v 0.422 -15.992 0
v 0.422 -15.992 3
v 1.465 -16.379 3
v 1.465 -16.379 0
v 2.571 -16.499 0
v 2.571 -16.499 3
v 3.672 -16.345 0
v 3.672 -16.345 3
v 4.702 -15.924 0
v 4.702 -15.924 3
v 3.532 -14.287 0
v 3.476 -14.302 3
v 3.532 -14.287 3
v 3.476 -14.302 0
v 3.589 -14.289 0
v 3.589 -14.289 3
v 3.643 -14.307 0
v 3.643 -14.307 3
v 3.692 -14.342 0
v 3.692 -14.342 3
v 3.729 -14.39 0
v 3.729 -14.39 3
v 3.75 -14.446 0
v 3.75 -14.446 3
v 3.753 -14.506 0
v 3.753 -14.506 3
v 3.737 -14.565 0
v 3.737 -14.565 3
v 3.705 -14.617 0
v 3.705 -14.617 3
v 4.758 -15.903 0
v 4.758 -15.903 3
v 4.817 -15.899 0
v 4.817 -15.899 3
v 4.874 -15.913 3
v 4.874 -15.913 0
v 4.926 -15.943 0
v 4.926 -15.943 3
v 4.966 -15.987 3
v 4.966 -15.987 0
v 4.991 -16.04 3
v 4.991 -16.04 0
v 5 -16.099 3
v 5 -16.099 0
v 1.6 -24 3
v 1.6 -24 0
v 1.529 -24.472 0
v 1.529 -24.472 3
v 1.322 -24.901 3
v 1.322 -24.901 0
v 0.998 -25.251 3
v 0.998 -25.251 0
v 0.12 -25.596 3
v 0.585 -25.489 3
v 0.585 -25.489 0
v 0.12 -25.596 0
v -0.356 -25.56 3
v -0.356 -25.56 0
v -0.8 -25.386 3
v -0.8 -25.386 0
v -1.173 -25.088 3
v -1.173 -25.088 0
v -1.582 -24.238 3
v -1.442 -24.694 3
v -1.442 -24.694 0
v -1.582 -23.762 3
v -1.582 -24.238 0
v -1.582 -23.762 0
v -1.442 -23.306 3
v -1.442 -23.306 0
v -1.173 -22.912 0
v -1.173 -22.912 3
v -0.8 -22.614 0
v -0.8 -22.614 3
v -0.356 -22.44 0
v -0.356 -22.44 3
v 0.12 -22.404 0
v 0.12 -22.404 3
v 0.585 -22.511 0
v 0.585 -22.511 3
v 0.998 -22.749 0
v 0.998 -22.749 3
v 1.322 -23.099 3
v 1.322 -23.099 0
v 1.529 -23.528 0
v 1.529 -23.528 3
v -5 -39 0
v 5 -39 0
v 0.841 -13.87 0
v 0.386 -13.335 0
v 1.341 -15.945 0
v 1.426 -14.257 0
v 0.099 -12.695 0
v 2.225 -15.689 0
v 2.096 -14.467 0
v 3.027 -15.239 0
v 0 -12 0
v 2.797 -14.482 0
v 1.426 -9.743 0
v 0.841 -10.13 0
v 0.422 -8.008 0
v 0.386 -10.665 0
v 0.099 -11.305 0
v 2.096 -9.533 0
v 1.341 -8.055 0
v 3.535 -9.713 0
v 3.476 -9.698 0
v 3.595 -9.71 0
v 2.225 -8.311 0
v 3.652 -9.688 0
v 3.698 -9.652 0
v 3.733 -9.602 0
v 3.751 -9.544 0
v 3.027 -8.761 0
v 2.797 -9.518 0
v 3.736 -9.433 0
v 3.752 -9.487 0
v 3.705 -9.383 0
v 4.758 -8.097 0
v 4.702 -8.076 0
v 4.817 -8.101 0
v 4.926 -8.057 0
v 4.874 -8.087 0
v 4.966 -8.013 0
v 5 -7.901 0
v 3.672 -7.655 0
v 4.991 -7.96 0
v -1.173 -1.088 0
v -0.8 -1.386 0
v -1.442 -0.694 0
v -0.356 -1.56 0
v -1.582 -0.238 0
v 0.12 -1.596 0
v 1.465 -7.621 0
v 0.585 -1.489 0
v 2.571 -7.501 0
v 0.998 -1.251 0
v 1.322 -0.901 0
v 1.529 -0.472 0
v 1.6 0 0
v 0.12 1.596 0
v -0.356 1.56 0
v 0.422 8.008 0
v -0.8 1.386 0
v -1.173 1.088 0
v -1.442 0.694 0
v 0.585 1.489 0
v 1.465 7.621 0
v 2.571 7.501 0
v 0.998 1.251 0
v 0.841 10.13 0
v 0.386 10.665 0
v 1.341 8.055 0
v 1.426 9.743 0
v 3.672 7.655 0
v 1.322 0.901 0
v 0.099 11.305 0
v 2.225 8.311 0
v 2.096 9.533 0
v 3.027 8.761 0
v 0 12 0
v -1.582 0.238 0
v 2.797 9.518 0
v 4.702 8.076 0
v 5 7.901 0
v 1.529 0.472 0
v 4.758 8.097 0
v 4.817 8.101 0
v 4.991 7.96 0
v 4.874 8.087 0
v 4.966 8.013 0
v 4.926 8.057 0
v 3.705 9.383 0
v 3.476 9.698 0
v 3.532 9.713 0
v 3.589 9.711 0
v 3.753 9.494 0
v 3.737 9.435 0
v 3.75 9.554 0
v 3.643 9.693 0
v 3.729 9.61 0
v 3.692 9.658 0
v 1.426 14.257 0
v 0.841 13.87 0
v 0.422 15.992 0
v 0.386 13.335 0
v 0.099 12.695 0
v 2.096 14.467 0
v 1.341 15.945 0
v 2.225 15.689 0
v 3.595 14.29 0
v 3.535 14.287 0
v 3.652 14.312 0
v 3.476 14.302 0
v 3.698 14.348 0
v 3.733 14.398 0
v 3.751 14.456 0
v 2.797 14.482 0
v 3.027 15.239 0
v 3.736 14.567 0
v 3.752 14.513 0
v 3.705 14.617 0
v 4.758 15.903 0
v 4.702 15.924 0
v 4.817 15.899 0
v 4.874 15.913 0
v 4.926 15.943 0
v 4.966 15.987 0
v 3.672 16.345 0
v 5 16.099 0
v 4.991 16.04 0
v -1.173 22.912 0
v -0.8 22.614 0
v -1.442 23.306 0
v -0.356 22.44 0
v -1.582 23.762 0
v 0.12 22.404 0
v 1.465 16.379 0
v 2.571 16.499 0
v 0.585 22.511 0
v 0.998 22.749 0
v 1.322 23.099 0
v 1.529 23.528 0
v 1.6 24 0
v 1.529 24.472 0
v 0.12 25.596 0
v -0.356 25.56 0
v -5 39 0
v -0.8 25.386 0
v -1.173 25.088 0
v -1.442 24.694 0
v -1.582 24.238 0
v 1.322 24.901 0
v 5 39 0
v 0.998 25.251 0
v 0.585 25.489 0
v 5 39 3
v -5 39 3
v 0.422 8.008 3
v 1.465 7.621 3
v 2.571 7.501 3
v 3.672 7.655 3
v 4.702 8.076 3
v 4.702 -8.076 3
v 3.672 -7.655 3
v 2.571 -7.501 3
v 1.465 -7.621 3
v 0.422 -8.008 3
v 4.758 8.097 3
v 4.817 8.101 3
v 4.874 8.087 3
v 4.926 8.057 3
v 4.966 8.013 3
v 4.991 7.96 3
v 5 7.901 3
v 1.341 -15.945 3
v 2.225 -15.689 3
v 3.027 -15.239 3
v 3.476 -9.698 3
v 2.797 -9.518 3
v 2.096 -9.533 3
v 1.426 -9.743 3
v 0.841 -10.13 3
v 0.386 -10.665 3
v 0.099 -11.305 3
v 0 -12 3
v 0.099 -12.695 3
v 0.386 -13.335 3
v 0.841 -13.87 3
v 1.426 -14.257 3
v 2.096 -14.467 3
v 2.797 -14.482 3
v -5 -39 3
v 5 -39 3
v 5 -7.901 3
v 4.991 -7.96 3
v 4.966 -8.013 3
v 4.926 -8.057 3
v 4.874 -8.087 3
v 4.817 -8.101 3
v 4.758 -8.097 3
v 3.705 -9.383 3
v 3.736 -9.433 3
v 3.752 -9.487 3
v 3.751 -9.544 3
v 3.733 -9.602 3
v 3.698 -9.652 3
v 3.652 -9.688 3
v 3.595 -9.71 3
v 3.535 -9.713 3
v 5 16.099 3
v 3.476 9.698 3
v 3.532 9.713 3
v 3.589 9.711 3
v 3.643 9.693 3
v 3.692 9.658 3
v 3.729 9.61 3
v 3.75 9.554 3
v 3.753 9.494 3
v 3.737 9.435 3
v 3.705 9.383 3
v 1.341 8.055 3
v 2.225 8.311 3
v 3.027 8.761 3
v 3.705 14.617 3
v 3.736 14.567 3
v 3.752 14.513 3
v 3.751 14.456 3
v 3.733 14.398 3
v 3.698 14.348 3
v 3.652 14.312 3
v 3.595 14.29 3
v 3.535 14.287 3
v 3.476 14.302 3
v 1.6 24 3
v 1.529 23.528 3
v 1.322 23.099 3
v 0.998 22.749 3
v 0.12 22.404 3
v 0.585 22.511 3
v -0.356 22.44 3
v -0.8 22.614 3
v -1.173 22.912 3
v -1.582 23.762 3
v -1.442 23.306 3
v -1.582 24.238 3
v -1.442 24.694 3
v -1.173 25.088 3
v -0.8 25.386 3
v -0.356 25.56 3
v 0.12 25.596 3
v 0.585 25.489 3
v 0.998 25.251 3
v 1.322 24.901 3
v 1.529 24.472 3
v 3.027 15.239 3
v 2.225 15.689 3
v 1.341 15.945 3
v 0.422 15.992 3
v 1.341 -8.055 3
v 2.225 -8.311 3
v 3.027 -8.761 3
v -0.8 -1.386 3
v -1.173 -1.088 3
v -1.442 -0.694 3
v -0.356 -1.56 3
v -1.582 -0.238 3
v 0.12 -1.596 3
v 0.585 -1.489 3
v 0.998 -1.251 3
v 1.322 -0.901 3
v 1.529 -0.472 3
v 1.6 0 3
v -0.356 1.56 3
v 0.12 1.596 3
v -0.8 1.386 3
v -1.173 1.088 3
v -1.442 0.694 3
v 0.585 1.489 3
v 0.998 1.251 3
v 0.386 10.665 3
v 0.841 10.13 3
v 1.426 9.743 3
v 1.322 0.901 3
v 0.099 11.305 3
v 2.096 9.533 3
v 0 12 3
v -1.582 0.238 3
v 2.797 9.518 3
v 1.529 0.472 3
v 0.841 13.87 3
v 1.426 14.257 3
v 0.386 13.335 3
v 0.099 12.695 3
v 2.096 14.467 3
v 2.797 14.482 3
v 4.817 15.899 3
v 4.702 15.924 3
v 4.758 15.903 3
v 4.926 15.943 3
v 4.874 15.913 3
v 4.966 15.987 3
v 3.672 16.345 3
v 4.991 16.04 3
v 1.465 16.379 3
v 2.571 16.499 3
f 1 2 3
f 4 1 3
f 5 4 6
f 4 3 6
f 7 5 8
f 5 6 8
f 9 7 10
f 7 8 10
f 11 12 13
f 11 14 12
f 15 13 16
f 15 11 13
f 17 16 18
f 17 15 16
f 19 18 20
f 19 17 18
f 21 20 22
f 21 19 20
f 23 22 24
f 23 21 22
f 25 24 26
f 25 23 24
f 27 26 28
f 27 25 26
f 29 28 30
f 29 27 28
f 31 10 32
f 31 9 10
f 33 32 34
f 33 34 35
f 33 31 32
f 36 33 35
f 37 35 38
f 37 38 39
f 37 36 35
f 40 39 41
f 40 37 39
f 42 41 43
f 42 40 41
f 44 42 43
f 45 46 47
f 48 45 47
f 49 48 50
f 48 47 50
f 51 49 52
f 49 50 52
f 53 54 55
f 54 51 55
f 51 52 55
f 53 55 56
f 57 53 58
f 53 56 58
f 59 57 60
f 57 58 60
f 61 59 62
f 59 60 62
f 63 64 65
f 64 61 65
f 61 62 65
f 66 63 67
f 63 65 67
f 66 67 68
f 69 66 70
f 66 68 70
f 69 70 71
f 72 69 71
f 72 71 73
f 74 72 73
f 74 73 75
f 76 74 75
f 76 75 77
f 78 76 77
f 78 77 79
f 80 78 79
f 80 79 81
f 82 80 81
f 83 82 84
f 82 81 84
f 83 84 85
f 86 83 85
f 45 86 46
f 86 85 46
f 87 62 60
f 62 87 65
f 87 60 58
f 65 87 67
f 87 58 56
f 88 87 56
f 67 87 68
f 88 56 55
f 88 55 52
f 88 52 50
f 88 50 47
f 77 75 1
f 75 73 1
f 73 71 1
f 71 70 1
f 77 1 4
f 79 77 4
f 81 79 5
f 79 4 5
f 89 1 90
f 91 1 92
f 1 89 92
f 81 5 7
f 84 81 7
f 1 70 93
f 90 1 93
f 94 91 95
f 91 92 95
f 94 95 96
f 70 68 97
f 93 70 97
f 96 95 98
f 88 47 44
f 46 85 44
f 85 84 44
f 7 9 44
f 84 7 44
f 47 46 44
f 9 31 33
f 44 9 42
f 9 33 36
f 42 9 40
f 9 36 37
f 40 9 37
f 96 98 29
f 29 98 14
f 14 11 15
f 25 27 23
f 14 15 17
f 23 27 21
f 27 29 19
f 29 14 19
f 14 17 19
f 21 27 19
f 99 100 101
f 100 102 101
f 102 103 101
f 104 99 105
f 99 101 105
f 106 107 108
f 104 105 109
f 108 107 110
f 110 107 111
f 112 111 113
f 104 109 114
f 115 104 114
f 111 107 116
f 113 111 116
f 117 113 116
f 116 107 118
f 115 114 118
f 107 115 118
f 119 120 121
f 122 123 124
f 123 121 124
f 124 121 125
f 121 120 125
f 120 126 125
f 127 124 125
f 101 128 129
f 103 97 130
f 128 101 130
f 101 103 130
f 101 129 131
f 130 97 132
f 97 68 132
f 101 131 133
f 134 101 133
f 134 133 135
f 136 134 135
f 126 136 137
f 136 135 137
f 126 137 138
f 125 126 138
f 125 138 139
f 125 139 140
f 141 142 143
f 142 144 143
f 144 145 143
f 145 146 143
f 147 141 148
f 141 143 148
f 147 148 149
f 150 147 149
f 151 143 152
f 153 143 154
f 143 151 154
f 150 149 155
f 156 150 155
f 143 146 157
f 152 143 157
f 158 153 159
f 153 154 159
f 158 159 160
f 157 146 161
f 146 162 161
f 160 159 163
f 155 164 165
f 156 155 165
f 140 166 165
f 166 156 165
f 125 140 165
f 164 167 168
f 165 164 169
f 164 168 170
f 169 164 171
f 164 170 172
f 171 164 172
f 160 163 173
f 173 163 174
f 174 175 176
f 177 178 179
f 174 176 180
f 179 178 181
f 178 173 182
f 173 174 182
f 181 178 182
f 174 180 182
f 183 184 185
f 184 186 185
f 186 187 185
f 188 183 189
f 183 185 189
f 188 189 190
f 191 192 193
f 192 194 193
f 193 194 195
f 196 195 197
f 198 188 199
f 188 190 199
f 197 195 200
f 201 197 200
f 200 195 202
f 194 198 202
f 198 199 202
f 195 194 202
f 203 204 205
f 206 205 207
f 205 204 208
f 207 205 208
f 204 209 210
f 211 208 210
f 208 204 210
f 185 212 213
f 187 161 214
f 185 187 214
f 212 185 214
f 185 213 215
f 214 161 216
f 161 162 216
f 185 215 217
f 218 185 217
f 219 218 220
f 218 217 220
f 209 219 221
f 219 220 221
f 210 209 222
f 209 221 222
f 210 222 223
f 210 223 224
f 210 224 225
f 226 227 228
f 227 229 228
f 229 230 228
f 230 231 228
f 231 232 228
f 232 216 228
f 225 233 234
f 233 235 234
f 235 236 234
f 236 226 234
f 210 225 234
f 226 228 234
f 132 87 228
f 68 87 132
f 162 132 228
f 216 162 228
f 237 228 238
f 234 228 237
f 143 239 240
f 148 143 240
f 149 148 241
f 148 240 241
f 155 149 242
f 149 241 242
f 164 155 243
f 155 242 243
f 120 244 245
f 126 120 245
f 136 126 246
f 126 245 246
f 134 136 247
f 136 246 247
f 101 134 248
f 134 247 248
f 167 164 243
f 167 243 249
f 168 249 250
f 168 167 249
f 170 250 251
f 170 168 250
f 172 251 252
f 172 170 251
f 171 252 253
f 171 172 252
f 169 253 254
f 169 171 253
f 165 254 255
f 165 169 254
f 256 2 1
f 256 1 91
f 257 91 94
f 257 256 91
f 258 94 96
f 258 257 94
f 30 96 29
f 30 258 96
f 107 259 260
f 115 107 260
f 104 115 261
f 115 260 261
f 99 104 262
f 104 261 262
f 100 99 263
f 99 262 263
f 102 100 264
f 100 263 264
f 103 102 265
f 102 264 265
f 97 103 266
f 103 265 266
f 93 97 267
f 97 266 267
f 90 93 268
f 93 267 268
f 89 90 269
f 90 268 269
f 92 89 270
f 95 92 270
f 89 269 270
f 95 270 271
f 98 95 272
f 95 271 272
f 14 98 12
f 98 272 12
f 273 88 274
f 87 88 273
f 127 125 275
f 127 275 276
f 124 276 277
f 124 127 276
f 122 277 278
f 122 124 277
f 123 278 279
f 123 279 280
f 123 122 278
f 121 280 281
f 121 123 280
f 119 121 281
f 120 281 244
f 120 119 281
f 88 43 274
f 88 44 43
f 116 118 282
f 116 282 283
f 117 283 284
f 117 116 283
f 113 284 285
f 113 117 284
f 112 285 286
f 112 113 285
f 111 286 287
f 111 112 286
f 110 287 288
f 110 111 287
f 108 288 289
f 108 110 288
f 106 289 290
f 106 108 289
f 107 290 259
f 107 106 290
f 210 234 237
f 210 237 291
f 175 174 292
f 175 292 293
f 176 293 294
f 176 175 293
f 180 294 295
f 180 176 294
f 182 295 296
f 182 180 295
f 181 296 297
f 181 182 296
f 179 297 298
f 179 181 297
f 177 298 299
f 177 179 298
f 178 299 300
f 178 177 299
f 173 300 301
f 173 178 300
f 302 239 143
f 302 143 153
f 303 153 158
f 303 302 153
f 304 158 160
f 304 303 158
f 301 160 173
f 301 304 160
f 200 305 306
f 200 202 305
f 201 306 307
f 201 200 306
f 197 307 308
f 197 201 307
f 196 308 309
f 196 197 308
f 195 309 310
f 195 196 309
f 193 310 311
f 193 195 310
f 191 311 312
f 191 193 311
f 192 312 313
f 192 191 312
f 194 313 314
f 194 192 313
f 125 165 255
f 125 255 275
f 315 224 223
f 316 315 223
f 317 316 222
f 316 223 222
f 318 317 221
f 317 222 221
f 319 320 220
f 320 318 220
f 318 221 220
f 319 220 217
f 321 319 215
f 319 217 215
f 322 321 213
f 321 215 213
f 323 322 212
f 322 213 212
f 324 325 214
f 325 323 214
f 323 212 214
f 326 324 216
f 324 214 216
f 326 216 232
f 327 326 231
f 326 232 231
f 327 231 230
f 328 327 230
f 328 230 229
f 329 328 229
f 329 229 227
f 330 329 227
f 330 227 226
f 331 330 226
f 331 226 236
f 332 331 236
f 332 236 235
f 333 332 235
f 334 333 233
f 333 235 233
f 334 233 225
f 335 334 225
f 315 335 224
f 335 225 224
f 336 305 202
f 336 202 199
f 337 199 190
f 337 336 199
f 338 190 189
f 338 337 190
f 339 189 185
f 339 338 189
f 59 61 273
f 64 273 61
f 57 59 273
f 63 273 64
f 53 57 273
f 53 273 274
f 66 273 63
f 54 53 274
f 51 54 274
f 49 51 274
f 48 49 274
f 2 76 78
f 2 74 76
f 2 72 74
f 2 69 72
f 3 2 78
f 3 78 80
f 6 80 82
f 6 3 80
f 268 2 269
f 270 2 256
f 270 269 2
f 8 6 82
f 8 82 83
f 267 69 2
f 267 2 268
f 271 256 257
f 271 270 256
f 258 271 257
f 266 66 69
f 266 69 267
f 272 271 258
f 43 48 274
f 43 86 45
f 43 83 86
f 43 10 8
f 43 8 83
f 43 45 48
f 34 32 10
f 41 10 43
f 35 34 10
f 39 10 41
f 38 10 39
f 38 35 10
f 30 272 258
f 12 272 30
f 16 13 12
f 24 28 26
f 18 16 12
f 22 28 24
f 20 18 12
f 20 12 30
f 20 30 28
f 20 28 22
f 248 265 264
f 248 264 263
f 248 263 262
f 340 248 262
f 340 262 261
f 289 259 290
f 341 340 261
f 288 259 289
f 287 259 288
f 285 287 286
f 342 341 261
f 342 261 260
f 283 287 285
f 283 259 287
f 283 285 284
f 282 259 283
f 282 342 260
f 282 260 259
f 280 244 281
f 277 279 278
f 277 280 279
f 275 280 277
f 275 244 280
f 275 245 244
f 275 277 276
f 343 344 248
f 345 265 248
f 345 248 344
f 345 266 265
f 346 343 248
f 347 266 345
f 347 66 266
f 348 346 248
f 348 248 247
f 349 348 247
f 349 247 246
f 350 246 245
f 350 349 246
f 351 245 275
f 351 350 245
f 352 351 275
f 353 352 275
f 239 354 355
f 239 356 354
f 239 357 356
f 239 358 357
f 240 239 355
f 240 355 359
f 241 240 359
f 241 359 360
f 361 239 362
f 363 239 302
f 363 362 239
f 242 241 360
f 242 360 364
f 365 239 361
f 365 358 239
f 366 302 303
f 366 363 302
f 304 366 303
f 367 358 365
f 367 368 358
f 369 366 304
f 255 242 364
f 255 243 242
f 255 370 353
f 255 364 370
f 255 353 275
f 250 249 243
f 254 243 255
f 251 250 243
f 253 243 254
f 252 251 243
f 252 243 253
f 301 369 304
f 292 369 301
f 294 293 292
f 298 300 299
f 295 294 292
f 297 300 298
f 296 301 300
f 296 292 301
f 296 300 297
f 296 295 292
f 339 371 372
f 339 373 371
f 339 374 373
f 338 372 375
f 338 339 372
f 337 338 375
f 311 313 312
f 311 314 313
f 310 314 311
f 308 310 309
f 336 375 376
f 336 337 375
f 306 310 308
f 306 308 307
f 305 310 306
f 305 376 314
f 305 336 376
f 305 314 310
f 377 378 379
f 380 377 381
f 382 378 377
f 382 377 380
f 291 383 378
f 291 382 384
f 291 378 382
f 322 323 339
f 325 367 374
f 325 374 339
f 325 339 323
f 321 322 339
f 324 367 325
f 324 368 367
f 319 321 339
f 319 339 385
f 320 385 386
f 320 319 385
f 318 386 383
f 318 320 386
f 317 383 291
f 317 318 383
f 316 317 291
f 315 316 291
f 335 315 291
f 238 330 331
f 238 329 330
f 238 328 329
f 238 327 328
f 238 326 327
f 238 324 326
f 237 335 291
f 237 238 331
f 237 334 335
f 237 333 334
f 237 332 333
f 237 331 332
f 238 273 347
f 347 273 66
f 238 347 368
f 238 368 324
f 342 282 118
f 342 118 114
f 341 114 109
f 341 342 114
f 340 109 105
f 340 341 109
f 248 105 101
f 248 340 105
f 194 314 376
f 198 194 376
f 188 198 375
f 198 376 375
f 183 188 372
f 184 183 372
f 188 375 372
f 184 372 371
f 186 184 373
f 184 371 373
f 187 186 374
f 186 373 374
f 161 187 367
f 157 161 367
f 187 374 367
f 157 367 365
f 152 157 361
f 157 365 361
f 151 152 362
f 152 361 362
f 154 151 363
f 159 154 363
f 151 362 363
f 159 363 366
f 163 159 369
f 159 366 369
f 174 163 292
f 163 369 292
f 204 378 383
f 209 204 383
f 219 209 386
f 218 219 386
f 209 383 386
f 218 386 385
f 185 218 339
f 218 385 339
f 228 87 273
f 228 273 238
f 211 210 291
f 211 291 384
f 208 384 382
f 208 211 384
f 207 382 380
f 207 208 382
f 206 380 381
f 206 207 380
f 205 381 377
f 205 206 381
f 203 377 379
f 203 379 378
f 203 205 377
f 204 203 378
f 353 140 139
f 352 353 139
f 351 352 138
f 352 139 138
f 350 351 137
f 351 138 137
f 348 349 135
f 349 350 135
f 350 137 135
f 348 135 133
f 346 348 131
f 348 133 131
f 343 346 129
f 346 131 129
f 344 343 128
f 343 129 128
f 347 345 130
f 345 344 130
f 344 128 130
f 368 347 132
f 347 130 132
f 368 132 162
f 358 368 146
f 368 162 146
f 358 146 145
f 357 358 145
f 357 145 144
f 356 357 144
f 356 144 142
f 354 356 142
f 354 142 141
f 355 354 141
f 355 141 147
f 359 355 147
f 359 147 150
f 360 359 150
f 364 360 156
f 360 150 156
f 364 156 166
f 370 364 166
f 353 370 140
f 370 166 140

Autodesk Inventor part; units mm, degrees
ref_plane "YZ Plane" through (0, 0, 0) normal (1, 0, 0) x (0, 1, 0)
ref_plane "XZ Plane" through (0, 0, 0) normal (0, 1, 0) x (-1, 0, 0)
ref_plane "XY Plane" through (0, 0, 0) normal (0, 0, 1) x (1, 0, 0)
sketch "スケッチ1" plane through (0, 0, 0) normal (0, 0, 1) x (1, 0, 0)
  line L0 (-5, 39) -> (5, 39)
  line L1 (5, 39) -> (5, -39)
  line L2 (5, -39) -> (-5, -39)
  line L3 (-5, -39) -> (-5, 39)
  circle A0 centre (0, 24) radius 1.6
  circle A1 centre (0, 0) radius 1.6
  circle A2 centre (0, -24) radius 1.6
  dimension "d0" = 3.2
  dimension "d1" = 15
  dimension "d2" = 24
  dimension "d3" = 24
  dimension "d4" = 5
  dimension "d5" = 15
  dimension "d6" = 10
extrude "押し出し1" add sketch "スケッチ1" along normal blind 3
sketch "スケッチ2" plane through (0, 0, 3) normal (0, 0, 1) x (1, 0, 0)
  circle A0 centre (2.5, 12) radius 2.5
  line L0 (2.5, 12) -> (5, 14.5)
  line L1 (2.5, 12) -> (5, 9.5)
  line L2 (2.5, 12) -> (5, 12)
  line L3 (5, -39) -> (5, 39) projected
  circle A1 centre (0, 24) radius 1.6 projected
  circle A2 centre (0.6796, 12) radius 4
  circle A3 centre (2.5, 12) radius 4.5
  point P0 (0, 0)
  point P1 (4.2678, 13.7678)
  point P2 (4.2678, 10.2322)
  point P3 (0.4225, 8.0083)
  point P4 (5, 8.2583)
  point P5 (5, 15.7417)
  point P6 (0.4225, 15.9917)
  dimension "d9" = 5
  dimension "d12" = 8
  dimension "d10" = 45
  dimension "d11" = 12
  dimension "d13" = 9
extrude "押し出し2" cut sketch "スケッチ2" against normal through all contours L2 A2 A0 | L3 L1 A0 | A0 A2 L2 | A0 L0 L3 | L0 L1 A0 | A2 L2 L0 | A2 A3 L3 L0 | L1 L3 A3 A2 | L1 L2 A2
fillet "フィレット1" radius 0.2 4 edges at (4.2678, 13.7678, 1.5) (4.2678, 10.2322, 1.5) (5, 15.7417, 1.5) (5, 8.2583, 1.5)
mirror "ミラー1" about plane through (0, 0, 0) normal (0, 1, 0) of "押し出し2", "フィレット1"
properties part number "cover_setter_side_front"
